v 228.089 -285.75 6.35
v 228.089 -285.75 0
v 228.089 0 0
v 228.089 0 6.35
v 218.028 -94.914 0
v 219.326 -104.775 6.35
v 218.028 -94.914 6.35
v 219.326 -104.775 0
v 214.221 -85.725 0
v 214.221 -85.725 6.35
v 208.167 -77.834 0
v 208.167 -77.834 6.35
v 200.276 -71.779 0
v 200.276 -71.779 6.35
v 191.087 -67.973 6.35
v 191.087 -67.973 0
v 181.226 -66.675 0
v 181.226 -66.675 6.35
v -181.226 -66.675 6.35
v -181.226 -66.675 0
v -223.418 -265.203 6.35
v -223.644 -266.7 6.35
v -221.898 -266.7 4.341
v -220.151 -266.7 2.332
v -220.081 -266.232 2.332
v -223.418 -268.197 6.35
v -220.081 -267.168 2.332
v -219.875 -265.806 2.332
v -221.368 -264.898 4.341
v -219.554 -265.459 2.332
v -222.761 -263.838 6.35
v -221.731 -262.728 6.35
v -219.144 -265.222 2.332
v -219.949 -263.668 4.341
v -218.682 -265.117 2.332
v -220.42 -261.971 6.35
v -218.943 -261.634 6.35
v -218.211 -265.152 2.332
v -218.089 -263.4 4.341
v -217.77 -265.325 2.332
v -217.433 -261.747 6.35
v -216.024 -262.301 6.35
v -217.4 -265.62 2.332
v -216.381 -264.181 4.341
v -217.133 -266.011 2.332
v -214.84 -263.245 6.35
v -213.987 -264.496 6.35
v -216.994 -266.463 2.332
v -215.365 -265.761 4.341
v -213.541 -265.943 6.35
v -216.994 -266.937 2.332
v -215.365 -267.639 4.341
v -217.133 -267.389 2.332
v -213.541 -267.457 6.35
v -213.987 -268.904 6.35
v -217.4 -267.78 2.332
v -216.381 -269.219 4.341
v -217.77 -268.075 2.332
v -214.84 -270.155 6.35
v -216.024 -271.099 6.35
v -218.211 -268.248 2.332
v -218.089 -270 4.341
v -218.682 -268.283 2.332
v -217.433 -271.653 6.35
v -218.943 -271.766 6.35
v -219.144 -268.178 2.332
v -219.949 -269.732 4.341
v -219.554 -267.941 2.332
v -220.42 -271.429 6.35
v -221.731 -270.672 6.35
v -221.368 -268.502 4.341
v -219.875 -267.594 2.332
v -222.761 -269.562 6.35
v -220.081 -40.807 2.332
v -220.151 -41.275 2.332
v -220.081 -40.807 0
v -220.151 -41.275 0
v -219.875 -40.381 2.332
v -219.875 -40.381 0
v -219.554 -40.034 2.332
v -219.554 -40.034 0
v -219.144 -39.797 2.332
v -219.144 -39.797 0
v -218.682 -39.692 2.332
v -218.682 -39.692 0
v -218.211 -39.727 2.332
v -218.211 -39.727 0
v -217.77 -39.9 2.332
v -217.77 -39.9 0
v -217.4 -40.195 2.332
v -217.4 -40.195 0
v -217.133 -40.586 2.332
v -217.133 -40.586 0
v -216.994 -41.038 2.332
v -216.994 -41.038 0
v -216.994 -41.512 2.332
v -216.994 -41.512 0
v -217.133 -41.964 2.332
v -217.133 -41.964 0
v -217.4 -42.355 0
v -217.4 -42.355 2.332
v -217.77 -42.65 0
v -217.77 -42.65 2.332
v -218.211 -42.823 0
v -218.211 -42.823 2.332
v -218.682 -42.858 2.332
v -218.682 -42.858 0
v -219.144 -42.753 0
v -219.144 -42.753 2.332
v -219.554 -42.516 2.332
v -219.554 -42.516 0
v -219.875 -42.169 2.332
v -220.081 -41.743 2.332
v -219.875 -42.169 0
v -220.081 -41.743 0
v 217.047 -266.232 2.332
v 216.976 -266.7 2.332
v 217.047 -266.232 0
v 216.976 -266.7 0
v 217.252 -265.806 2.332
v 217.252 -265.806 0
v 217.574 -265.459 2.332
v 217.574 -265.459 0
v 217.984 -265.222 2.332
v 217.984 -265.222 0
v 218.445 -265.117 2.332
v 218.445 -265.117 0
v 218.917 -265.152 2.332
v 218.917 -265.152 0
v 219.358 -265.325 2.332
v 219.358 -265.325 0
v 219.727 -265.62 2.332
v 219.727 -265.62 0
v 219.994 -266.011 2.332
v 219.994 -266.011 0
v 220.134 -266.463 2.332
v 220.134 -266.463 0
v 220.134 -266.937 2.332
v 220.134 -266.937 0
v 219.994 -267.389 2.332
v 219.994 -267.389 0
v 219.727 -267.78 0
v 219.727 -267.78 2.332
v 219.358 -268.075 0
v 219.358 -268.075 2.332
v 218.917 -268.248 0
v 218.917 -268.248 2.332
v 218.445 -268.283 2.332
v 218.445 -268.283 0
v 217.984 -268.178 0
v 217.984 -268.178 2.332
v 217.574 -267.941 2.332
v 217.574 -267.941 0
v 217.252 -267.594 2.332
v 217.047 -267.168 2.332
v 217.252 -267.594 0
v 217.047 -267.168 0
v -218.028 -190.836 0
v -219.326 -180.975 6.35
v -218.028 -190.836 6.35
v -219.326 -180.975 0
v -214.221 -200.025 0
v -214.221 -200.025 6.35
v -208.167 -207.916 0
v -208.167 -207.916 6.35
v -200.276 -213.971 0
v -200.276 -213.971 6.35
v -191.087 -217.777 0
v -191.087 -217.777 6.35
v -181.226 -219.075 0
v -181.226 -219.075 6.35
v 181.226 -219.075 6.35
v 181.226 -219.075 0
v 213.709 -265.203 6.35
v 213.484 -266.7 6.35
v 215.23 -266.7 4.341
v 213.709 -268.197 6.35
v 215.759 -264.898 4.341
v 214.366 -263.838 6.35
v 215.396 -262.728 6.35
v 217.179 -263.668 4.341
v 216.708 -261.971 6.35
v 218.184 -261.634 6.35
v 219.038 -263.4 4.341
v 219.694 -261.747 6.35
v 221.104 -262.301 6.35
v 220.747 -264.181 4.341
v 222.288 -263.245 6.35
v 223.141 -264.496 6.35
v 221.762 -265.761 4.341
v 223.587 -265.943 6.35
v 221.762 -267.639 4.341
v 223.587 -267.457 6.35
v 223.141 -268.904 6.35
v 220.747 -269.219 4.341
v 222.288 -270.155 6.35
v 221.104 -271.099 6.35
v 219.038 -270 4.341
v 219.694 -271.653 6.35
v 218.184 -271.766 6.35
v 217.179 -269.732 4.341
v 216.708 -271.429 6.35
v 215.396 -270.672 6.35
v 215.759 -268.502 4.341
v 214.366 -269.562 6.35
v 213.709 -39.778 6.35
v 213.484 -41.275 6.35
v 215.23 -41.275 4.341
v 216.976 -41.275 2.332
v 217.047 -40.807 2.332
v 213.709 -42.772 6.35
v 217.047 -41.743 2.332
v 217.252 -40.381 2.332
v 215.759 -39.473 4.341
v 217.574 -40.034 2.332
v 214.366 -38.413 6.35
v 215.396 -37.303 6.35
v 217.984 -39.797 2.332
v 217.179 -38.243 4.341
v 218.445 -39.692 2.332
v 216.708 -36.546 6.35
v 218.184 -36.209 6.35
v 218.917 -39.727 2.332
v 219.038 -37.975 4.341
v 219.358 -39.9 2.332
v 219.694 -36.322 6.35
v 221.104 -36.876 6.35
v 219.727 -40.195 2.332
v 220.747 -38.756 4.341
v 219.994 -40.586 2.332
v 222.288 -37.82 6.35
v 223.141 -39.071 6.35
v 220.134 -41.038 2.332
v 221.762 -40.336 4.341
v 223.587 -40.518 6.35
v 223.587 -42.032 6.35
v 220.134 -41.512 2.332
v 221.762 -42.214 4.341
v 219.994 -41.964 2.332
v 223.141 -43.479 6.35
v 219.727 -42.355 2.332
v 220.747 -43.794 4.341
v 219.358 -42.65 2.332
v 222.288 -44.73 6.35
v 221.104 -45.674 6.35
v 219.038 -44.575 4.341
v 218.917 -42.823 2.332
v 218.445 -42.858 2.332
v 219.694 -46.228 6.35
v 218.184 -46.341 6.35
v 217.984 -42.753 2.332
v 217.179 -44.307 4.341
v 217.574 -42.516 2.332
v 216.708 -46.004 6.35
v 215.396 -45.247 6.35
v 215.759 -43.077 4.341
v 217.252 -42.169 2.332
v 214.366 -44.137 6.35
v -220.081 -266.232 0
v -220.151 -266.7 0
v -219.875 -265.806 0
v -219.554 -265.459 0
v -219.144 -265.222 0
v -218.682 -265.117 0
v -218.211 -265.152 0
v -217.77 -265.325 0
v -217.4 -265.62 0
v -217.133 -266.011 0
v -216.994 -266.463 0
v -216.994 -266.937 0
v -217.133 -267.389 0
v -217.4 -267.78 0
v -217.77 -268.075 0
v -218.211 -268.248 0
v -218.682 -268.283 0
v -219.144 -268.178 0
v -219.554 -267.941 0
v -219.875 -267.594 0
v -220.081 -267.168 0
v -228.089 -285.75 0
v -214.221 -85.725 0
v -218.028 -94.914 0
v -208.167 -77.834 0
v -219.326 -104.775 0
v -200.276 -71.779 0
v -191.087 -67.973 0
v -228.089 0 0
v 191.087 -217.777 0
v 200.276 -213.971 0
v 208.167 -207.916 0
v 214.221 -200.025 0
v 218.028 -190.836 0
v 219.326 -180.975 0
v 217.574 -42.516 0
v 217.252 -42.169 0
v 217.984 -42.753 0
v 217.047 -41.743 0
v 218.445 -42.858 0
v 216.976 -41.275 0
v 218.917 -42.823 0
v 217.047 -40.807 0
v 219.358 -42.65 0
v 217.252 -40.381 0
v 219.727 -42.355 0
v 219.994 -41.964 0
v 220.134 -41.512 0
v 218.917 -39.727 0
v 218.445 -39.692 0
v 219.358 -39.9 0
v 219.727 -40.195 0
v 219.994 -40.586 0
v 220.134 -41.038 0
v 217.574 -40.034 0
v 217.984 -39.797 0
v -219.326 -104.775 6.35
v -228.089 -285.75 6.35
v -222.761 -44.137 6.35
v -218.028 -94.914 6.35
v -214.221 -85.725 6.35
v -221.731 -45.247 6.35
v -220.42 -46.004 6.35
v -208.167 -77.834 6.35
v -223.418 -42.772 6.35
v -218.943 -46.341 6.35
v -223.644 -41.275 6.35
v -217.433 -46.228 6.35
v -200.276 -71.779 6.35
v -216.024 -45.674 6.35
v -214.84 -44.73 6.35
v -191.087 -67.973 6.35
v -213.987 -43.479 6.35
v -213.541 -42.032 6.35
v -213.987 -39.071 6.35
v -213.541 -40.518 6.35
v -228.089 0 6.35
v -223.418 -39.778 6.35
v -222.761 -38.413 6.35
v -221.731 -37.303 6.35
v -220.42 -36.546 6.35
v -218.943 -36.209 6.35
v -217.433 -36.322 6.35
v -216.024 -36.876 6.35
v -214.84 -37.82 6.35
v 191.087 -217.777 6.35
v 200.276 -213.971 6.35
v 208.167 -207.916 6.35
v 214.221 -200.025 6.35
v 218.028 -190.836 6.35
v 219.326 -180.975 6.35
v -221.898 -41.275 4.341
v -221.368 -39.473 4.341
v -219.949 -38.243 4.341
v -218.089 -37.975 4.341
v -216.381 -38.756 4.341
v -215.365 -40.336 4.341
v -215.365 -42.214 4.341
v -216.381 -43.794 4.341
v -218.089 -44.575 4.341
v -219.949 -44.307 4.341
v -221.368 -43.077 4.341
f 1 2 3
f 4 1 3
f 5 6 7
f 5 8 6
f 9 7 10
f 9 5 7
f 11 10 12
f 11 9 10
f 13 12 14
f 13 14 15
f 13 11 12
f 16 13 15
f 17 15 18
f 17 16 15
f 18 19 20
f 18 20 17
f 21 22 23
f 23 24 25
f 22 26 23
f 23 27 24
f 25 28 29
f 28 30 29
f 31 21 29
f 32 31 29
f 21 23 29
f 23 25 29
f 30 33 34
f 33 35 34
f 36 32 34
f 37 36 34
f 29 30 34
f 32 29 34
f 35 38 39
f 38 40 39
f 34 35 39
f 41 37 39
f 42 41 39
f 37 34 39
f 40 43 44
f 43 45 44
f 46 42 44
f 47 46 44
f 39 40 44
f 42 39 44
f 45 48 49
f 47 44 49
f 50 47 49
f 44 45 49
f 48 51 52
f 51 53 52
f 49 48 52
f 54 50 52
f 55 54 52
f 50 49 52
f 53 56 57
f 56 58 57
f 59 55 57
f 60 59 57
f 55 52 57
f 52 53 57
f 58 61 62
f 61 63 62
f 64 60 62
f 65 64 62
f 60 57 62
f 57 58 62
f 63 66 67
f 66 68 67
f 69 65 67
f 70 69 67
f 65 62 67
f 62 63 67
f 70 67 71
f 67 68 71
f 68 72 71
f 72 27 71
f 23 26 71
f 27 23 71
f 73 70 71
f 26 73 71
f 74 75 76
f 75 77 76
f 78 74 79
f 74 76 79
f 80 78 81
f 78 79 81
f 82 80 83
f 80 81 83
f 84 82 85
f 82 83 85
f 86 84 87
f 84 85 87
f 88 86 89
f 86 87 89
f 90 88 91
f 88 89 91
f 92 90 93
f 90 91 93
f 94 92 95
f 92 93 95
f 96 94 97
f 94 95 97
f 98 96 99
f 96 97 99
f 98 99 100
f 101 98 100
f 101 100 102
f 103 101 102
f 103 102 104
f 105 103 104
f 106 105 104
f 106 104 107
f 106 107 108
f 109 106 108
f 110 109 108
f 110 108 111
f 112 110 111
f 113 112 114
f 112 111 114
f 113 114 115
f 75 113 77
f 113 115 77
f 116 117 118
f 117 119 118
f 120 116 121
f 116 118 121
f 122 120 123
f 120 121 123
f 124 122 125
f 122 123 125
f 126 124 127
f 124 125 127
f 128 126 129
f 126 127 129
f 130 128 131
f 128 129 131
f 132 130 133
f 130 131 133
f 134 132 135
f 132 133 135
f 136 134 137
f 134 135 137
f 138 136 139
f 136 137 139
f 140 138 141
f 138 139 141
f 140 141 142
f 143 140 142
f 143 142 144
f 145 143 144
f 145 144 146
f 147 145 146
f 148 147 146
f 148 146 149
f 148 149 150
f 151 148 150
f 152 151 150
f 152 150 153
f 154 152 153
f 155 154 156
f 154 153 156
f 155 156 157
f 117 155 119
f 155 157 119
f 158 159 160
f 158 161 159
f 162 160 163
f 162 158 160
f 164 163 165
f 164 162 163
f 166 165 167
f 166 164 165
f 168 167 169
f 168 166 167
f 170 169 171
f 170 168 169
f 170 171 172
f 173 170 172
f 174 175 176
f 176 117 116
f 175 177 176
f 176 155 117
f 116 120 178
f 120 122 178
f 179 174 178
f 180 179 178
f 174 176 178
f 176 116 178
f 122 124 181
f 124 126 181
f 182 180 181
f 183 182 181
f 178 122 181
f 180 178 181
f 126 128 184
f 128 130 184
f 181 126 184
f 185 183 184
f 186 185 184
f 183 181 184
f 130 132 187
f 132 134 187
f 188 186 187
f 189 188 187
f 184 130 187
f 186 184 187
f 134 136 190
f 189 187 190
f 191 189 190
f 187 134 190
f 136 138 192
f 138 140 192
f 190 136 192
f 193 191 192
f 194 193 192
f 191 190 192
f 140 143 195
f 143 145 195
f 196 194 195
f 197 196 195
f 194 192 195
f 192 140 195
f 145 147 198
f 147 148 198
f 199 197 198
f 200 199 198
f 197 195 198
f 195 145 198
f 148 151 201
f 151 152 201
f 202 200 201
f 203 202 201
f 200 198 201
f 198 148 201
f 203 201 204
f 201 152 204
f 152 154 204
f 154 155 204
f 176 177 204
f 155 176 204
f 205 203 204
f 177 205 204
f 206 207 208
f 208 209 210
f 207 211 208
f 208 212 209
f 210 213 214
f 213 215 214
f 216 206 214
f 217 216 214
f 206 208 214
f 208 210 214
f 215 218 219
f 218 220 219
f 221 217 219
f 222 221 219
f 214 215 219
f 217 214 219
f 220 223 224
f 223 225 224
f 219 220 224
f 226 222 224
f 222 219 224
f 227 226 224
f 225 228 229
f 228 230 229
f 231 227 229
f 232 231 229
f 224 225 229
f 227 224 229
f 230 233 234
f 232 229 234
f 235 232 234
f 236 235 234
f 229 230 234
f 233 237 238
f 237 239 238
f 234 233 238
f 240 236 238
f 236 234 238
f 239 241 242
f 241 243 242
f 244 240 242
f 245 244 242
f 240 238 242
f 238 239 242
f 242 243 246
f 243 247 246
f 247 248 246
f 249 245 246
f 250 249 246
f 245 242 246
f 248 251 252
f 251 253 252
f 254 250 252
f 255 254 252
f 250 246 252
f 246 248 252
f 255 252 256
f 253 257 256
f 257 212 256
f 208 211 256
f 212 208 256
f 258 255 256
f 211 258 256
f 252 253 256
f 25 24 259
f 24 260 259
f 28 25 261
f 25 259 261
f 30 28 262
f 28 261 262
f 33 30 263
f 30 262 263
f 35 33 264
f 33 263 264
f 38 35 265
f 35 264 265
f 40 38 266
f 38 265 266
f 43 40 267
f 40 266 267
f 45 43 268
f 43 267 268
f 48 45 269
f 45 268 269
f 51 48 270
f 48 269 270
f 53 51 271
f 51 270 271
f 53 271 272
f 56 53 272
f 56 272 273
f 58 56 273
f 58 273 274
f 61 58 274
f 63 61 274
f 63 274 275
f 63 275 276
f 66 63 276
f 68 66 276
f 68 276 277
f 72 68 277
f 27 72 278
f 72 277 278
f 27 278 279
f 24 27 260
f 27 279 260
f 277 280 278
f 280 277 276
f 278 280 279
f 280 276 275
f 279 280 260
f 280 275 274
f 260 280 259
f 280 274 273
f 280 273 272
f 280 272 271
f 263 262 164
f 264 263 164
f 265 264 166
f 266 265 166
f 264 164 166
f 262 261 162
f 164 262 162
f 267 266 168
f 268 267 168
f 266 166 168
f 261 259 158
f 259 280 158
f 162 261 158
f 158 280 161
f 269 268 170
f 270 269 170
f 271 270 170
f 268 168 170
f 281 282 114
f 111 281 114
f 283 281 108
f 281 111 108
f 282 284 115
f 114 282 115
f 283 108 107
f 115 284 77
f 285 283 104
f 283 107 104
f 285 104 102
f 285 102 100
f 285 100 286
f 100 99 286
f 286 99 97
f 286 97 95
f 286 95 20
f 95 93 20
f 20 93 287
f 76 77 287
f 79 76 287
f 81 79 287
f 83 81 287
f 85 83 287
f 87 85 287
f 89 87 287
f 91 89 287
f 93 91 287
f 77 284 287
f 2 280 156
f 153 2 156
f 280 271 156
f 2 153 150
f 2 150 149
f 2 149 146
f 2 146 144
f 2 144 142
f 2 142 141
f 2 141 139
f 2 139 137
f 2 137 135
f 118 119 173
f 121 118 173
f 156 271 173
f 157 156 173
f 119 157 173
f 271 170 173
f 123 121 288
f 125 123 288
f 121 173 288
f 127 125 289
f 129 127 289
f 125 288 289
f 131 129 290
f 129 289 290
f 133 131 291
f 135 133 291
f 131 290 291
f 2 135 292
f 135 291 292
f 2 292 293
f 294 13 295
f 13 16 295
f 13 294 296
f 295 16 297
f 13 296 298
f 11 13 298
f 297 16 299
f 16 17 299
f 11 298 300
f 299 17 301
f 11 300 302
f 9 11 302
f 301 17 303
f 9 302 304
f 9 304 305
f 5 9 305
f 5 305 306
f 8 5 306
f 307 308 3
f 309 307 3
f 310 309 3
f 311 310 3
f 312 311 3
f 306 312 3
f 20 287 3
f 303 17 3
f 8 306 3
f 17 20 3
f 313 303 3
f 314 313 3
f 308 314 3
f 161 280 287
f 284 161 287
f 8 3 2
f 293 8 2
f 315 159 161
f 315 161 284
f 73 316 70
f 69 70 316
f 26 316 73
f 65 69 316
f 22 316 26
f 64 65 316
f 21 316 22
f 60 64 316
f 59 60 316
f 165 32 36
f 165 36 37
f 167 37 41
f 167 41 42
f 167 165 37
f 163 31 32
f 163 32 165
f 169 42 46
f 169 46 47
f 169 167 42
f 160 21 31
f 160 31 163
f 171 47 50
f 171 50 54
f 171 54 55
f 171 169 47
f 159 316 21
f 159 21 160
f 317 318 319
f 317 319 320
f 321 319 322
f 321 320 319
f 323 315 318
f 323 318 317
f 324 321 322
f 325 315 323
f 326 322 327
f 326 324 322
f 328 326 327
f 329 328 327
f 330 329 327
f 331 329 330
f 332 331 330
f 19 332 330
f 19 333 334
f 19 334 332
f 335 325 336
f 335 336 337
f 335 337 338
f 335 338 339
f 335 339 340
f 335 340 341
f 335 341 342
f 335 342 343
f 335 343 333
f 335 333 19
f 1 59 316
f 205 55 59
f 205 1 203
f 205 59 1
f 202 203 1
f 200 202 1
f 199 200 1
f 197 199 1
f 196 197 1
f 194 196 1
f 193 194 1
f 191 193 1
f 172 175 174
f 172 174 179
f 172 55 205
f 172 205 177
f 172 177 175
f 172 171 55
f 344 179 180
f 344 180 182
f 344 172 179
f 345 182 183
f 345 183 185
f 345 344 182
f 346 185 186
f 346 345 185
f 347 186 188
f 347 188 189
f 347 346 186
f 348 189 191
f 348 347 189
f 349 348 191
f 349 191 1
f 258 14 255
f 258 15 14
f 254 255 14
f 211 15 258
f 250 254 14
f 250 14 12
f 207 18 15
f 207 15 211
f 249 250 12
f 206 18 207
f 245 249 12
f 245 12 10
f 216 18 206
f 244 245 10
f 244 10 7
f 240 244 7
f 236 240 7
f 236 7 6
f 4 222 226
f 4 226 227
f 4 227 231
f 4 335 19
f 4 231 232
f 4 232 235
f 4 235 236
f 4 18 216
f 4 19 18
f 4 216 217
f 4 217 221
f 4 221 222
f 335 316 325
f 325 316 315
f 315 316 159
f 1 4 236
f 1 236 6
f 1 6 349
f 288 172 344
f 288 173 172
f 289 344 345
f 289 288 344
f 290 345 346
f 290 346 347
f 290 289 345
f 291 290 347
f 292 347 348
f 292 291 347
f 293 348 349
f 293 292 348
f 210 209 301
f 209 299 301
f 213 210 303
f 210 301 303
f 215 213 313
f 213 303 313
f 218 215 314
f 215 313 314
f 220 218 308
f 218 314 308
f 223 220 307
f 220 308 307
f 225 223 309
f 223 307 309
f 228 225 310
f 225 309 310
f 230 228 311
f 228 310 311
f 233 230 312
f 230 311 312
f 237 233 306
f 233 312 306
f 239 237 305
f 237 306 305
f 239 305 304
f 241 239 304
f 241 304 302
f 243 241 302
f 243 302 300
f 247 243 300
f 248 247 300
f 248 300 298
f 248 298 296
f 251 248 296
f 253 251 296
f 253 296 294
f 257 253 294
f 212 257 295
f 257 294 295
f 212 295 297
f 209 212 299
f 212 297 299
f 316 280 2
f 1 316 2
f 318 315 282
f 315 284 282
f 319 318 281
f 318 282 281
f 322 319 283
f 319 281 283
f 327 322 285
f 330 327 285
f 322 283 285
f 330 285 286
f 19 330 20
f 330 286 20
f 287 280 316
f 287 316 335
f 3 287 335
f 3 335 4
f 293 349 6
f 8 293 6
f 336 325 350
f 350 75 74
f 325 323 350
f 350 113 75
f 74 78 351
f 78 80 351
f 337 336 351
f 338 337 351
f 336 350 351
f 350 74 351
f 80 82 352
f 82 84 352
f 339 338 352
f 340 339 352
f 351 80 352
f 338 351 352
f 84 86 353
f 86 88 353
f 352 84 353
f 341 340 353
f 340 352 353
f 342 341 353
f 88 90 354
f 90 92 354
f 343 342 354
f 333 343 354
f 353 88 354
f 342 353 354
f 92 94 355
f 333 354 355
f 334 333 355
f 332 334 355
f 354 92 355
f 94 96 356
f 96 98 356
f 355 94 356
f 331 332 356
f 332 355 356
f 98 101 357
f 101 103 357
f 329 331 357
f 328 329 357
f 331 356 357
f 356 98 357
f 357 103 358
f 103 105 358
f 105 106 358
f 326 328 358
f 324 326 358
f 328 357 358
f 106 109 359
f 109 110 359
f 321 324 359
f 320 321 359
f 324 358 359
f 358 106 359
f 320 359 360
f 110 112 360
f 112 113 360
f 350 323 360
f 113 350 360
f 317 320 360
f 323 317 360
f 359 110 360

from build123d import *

# Parameters (mm, degrees)
SKETCH1_W           = 456.177532672
SKETCH1_H           = 285.75
BOSS_EXTRUDE1_DEPTH = 6.35
CUT_EXTRUDE1_REACH  = 367.675
SKETCH2_W           = 438.651532672
SKETCH2_H           = 152.4
FILLET1_R           = 38.1
HOLE1_D             = 3.175
HOLE1_DEPTH         = 38.1
HOLE1_CSINK_D       = 10.16
HOLE1_CSINK_ANGLE   = 82
HOLE1_TIP           = 0.953866233


with BuildPart() as part:
    # Sketch1 → Boss-Extrude1 (new body)
    with BuildSketch(Plane.XY):
        with Locations((0, -142.875)):
            Rectangle(SKETCH1_W, SKETCH1_H)
    extrude(amount=BOSS_EXTRUDE1_DEPTH)

    # Sketch2 → Cut-Extrude1 (cut, up to next)
    with BuildSketch(Plane.XY.offset(6.35), mode=Mode.PRIVATE) as cut_extrude1_sk1:
        with Locations((0, -142.875)):
            Rectangle(SKETCH2_W, SKETCH2_H)
    cut_extrude1_tool1 = extrude(cut_extrude1_sk1.sketch, amount=-CUT_EXTRUDE1_REACH, mode=Mode.PRIVATE) & part.part
    add(cut_extrude1_tool1.solids().sort_by_distance((0, -142.875, 6.35))[0], mode=Mode.SUBTRACT)

    # Fillet1
    fillet1_edges = [part.edges().sort_by_distance(p)[0] for p in [
        (219.325766336, -66.675, 3.175),
        (219.325766336, -219.075, 3.175),
        (-219.325766336, -219.075, 3.175),
        (-219.325766336, -66.675, 3.175),
    ]]
    fillet(fillet1_edges, radius=FILLET1_R)

    # Hole1
    with Locations(Plane.XY.offset(6.35)):
        with Locations((-218.563766336, -266.7), (-218.563766336, -41.275), (218.563766336, -266.7), (218.563766336, -41.275)):
            CounterSinkHole(HOLE1_D / 2, HOLE1_CSINK_D / 2, depth=HOLE1_DEPTH, counter_sink_angle=HOLE1_CSINK_ANGLE)
            with Locations((0, 0, -(HOLE1_DEPTH + HOLE1_TIP / 2))):  # 118° drill point
                Cone(0, HOLE1_D / 2, HOLE1_TIP, mode=Mode.SUBTRACT)


solid = part.part
